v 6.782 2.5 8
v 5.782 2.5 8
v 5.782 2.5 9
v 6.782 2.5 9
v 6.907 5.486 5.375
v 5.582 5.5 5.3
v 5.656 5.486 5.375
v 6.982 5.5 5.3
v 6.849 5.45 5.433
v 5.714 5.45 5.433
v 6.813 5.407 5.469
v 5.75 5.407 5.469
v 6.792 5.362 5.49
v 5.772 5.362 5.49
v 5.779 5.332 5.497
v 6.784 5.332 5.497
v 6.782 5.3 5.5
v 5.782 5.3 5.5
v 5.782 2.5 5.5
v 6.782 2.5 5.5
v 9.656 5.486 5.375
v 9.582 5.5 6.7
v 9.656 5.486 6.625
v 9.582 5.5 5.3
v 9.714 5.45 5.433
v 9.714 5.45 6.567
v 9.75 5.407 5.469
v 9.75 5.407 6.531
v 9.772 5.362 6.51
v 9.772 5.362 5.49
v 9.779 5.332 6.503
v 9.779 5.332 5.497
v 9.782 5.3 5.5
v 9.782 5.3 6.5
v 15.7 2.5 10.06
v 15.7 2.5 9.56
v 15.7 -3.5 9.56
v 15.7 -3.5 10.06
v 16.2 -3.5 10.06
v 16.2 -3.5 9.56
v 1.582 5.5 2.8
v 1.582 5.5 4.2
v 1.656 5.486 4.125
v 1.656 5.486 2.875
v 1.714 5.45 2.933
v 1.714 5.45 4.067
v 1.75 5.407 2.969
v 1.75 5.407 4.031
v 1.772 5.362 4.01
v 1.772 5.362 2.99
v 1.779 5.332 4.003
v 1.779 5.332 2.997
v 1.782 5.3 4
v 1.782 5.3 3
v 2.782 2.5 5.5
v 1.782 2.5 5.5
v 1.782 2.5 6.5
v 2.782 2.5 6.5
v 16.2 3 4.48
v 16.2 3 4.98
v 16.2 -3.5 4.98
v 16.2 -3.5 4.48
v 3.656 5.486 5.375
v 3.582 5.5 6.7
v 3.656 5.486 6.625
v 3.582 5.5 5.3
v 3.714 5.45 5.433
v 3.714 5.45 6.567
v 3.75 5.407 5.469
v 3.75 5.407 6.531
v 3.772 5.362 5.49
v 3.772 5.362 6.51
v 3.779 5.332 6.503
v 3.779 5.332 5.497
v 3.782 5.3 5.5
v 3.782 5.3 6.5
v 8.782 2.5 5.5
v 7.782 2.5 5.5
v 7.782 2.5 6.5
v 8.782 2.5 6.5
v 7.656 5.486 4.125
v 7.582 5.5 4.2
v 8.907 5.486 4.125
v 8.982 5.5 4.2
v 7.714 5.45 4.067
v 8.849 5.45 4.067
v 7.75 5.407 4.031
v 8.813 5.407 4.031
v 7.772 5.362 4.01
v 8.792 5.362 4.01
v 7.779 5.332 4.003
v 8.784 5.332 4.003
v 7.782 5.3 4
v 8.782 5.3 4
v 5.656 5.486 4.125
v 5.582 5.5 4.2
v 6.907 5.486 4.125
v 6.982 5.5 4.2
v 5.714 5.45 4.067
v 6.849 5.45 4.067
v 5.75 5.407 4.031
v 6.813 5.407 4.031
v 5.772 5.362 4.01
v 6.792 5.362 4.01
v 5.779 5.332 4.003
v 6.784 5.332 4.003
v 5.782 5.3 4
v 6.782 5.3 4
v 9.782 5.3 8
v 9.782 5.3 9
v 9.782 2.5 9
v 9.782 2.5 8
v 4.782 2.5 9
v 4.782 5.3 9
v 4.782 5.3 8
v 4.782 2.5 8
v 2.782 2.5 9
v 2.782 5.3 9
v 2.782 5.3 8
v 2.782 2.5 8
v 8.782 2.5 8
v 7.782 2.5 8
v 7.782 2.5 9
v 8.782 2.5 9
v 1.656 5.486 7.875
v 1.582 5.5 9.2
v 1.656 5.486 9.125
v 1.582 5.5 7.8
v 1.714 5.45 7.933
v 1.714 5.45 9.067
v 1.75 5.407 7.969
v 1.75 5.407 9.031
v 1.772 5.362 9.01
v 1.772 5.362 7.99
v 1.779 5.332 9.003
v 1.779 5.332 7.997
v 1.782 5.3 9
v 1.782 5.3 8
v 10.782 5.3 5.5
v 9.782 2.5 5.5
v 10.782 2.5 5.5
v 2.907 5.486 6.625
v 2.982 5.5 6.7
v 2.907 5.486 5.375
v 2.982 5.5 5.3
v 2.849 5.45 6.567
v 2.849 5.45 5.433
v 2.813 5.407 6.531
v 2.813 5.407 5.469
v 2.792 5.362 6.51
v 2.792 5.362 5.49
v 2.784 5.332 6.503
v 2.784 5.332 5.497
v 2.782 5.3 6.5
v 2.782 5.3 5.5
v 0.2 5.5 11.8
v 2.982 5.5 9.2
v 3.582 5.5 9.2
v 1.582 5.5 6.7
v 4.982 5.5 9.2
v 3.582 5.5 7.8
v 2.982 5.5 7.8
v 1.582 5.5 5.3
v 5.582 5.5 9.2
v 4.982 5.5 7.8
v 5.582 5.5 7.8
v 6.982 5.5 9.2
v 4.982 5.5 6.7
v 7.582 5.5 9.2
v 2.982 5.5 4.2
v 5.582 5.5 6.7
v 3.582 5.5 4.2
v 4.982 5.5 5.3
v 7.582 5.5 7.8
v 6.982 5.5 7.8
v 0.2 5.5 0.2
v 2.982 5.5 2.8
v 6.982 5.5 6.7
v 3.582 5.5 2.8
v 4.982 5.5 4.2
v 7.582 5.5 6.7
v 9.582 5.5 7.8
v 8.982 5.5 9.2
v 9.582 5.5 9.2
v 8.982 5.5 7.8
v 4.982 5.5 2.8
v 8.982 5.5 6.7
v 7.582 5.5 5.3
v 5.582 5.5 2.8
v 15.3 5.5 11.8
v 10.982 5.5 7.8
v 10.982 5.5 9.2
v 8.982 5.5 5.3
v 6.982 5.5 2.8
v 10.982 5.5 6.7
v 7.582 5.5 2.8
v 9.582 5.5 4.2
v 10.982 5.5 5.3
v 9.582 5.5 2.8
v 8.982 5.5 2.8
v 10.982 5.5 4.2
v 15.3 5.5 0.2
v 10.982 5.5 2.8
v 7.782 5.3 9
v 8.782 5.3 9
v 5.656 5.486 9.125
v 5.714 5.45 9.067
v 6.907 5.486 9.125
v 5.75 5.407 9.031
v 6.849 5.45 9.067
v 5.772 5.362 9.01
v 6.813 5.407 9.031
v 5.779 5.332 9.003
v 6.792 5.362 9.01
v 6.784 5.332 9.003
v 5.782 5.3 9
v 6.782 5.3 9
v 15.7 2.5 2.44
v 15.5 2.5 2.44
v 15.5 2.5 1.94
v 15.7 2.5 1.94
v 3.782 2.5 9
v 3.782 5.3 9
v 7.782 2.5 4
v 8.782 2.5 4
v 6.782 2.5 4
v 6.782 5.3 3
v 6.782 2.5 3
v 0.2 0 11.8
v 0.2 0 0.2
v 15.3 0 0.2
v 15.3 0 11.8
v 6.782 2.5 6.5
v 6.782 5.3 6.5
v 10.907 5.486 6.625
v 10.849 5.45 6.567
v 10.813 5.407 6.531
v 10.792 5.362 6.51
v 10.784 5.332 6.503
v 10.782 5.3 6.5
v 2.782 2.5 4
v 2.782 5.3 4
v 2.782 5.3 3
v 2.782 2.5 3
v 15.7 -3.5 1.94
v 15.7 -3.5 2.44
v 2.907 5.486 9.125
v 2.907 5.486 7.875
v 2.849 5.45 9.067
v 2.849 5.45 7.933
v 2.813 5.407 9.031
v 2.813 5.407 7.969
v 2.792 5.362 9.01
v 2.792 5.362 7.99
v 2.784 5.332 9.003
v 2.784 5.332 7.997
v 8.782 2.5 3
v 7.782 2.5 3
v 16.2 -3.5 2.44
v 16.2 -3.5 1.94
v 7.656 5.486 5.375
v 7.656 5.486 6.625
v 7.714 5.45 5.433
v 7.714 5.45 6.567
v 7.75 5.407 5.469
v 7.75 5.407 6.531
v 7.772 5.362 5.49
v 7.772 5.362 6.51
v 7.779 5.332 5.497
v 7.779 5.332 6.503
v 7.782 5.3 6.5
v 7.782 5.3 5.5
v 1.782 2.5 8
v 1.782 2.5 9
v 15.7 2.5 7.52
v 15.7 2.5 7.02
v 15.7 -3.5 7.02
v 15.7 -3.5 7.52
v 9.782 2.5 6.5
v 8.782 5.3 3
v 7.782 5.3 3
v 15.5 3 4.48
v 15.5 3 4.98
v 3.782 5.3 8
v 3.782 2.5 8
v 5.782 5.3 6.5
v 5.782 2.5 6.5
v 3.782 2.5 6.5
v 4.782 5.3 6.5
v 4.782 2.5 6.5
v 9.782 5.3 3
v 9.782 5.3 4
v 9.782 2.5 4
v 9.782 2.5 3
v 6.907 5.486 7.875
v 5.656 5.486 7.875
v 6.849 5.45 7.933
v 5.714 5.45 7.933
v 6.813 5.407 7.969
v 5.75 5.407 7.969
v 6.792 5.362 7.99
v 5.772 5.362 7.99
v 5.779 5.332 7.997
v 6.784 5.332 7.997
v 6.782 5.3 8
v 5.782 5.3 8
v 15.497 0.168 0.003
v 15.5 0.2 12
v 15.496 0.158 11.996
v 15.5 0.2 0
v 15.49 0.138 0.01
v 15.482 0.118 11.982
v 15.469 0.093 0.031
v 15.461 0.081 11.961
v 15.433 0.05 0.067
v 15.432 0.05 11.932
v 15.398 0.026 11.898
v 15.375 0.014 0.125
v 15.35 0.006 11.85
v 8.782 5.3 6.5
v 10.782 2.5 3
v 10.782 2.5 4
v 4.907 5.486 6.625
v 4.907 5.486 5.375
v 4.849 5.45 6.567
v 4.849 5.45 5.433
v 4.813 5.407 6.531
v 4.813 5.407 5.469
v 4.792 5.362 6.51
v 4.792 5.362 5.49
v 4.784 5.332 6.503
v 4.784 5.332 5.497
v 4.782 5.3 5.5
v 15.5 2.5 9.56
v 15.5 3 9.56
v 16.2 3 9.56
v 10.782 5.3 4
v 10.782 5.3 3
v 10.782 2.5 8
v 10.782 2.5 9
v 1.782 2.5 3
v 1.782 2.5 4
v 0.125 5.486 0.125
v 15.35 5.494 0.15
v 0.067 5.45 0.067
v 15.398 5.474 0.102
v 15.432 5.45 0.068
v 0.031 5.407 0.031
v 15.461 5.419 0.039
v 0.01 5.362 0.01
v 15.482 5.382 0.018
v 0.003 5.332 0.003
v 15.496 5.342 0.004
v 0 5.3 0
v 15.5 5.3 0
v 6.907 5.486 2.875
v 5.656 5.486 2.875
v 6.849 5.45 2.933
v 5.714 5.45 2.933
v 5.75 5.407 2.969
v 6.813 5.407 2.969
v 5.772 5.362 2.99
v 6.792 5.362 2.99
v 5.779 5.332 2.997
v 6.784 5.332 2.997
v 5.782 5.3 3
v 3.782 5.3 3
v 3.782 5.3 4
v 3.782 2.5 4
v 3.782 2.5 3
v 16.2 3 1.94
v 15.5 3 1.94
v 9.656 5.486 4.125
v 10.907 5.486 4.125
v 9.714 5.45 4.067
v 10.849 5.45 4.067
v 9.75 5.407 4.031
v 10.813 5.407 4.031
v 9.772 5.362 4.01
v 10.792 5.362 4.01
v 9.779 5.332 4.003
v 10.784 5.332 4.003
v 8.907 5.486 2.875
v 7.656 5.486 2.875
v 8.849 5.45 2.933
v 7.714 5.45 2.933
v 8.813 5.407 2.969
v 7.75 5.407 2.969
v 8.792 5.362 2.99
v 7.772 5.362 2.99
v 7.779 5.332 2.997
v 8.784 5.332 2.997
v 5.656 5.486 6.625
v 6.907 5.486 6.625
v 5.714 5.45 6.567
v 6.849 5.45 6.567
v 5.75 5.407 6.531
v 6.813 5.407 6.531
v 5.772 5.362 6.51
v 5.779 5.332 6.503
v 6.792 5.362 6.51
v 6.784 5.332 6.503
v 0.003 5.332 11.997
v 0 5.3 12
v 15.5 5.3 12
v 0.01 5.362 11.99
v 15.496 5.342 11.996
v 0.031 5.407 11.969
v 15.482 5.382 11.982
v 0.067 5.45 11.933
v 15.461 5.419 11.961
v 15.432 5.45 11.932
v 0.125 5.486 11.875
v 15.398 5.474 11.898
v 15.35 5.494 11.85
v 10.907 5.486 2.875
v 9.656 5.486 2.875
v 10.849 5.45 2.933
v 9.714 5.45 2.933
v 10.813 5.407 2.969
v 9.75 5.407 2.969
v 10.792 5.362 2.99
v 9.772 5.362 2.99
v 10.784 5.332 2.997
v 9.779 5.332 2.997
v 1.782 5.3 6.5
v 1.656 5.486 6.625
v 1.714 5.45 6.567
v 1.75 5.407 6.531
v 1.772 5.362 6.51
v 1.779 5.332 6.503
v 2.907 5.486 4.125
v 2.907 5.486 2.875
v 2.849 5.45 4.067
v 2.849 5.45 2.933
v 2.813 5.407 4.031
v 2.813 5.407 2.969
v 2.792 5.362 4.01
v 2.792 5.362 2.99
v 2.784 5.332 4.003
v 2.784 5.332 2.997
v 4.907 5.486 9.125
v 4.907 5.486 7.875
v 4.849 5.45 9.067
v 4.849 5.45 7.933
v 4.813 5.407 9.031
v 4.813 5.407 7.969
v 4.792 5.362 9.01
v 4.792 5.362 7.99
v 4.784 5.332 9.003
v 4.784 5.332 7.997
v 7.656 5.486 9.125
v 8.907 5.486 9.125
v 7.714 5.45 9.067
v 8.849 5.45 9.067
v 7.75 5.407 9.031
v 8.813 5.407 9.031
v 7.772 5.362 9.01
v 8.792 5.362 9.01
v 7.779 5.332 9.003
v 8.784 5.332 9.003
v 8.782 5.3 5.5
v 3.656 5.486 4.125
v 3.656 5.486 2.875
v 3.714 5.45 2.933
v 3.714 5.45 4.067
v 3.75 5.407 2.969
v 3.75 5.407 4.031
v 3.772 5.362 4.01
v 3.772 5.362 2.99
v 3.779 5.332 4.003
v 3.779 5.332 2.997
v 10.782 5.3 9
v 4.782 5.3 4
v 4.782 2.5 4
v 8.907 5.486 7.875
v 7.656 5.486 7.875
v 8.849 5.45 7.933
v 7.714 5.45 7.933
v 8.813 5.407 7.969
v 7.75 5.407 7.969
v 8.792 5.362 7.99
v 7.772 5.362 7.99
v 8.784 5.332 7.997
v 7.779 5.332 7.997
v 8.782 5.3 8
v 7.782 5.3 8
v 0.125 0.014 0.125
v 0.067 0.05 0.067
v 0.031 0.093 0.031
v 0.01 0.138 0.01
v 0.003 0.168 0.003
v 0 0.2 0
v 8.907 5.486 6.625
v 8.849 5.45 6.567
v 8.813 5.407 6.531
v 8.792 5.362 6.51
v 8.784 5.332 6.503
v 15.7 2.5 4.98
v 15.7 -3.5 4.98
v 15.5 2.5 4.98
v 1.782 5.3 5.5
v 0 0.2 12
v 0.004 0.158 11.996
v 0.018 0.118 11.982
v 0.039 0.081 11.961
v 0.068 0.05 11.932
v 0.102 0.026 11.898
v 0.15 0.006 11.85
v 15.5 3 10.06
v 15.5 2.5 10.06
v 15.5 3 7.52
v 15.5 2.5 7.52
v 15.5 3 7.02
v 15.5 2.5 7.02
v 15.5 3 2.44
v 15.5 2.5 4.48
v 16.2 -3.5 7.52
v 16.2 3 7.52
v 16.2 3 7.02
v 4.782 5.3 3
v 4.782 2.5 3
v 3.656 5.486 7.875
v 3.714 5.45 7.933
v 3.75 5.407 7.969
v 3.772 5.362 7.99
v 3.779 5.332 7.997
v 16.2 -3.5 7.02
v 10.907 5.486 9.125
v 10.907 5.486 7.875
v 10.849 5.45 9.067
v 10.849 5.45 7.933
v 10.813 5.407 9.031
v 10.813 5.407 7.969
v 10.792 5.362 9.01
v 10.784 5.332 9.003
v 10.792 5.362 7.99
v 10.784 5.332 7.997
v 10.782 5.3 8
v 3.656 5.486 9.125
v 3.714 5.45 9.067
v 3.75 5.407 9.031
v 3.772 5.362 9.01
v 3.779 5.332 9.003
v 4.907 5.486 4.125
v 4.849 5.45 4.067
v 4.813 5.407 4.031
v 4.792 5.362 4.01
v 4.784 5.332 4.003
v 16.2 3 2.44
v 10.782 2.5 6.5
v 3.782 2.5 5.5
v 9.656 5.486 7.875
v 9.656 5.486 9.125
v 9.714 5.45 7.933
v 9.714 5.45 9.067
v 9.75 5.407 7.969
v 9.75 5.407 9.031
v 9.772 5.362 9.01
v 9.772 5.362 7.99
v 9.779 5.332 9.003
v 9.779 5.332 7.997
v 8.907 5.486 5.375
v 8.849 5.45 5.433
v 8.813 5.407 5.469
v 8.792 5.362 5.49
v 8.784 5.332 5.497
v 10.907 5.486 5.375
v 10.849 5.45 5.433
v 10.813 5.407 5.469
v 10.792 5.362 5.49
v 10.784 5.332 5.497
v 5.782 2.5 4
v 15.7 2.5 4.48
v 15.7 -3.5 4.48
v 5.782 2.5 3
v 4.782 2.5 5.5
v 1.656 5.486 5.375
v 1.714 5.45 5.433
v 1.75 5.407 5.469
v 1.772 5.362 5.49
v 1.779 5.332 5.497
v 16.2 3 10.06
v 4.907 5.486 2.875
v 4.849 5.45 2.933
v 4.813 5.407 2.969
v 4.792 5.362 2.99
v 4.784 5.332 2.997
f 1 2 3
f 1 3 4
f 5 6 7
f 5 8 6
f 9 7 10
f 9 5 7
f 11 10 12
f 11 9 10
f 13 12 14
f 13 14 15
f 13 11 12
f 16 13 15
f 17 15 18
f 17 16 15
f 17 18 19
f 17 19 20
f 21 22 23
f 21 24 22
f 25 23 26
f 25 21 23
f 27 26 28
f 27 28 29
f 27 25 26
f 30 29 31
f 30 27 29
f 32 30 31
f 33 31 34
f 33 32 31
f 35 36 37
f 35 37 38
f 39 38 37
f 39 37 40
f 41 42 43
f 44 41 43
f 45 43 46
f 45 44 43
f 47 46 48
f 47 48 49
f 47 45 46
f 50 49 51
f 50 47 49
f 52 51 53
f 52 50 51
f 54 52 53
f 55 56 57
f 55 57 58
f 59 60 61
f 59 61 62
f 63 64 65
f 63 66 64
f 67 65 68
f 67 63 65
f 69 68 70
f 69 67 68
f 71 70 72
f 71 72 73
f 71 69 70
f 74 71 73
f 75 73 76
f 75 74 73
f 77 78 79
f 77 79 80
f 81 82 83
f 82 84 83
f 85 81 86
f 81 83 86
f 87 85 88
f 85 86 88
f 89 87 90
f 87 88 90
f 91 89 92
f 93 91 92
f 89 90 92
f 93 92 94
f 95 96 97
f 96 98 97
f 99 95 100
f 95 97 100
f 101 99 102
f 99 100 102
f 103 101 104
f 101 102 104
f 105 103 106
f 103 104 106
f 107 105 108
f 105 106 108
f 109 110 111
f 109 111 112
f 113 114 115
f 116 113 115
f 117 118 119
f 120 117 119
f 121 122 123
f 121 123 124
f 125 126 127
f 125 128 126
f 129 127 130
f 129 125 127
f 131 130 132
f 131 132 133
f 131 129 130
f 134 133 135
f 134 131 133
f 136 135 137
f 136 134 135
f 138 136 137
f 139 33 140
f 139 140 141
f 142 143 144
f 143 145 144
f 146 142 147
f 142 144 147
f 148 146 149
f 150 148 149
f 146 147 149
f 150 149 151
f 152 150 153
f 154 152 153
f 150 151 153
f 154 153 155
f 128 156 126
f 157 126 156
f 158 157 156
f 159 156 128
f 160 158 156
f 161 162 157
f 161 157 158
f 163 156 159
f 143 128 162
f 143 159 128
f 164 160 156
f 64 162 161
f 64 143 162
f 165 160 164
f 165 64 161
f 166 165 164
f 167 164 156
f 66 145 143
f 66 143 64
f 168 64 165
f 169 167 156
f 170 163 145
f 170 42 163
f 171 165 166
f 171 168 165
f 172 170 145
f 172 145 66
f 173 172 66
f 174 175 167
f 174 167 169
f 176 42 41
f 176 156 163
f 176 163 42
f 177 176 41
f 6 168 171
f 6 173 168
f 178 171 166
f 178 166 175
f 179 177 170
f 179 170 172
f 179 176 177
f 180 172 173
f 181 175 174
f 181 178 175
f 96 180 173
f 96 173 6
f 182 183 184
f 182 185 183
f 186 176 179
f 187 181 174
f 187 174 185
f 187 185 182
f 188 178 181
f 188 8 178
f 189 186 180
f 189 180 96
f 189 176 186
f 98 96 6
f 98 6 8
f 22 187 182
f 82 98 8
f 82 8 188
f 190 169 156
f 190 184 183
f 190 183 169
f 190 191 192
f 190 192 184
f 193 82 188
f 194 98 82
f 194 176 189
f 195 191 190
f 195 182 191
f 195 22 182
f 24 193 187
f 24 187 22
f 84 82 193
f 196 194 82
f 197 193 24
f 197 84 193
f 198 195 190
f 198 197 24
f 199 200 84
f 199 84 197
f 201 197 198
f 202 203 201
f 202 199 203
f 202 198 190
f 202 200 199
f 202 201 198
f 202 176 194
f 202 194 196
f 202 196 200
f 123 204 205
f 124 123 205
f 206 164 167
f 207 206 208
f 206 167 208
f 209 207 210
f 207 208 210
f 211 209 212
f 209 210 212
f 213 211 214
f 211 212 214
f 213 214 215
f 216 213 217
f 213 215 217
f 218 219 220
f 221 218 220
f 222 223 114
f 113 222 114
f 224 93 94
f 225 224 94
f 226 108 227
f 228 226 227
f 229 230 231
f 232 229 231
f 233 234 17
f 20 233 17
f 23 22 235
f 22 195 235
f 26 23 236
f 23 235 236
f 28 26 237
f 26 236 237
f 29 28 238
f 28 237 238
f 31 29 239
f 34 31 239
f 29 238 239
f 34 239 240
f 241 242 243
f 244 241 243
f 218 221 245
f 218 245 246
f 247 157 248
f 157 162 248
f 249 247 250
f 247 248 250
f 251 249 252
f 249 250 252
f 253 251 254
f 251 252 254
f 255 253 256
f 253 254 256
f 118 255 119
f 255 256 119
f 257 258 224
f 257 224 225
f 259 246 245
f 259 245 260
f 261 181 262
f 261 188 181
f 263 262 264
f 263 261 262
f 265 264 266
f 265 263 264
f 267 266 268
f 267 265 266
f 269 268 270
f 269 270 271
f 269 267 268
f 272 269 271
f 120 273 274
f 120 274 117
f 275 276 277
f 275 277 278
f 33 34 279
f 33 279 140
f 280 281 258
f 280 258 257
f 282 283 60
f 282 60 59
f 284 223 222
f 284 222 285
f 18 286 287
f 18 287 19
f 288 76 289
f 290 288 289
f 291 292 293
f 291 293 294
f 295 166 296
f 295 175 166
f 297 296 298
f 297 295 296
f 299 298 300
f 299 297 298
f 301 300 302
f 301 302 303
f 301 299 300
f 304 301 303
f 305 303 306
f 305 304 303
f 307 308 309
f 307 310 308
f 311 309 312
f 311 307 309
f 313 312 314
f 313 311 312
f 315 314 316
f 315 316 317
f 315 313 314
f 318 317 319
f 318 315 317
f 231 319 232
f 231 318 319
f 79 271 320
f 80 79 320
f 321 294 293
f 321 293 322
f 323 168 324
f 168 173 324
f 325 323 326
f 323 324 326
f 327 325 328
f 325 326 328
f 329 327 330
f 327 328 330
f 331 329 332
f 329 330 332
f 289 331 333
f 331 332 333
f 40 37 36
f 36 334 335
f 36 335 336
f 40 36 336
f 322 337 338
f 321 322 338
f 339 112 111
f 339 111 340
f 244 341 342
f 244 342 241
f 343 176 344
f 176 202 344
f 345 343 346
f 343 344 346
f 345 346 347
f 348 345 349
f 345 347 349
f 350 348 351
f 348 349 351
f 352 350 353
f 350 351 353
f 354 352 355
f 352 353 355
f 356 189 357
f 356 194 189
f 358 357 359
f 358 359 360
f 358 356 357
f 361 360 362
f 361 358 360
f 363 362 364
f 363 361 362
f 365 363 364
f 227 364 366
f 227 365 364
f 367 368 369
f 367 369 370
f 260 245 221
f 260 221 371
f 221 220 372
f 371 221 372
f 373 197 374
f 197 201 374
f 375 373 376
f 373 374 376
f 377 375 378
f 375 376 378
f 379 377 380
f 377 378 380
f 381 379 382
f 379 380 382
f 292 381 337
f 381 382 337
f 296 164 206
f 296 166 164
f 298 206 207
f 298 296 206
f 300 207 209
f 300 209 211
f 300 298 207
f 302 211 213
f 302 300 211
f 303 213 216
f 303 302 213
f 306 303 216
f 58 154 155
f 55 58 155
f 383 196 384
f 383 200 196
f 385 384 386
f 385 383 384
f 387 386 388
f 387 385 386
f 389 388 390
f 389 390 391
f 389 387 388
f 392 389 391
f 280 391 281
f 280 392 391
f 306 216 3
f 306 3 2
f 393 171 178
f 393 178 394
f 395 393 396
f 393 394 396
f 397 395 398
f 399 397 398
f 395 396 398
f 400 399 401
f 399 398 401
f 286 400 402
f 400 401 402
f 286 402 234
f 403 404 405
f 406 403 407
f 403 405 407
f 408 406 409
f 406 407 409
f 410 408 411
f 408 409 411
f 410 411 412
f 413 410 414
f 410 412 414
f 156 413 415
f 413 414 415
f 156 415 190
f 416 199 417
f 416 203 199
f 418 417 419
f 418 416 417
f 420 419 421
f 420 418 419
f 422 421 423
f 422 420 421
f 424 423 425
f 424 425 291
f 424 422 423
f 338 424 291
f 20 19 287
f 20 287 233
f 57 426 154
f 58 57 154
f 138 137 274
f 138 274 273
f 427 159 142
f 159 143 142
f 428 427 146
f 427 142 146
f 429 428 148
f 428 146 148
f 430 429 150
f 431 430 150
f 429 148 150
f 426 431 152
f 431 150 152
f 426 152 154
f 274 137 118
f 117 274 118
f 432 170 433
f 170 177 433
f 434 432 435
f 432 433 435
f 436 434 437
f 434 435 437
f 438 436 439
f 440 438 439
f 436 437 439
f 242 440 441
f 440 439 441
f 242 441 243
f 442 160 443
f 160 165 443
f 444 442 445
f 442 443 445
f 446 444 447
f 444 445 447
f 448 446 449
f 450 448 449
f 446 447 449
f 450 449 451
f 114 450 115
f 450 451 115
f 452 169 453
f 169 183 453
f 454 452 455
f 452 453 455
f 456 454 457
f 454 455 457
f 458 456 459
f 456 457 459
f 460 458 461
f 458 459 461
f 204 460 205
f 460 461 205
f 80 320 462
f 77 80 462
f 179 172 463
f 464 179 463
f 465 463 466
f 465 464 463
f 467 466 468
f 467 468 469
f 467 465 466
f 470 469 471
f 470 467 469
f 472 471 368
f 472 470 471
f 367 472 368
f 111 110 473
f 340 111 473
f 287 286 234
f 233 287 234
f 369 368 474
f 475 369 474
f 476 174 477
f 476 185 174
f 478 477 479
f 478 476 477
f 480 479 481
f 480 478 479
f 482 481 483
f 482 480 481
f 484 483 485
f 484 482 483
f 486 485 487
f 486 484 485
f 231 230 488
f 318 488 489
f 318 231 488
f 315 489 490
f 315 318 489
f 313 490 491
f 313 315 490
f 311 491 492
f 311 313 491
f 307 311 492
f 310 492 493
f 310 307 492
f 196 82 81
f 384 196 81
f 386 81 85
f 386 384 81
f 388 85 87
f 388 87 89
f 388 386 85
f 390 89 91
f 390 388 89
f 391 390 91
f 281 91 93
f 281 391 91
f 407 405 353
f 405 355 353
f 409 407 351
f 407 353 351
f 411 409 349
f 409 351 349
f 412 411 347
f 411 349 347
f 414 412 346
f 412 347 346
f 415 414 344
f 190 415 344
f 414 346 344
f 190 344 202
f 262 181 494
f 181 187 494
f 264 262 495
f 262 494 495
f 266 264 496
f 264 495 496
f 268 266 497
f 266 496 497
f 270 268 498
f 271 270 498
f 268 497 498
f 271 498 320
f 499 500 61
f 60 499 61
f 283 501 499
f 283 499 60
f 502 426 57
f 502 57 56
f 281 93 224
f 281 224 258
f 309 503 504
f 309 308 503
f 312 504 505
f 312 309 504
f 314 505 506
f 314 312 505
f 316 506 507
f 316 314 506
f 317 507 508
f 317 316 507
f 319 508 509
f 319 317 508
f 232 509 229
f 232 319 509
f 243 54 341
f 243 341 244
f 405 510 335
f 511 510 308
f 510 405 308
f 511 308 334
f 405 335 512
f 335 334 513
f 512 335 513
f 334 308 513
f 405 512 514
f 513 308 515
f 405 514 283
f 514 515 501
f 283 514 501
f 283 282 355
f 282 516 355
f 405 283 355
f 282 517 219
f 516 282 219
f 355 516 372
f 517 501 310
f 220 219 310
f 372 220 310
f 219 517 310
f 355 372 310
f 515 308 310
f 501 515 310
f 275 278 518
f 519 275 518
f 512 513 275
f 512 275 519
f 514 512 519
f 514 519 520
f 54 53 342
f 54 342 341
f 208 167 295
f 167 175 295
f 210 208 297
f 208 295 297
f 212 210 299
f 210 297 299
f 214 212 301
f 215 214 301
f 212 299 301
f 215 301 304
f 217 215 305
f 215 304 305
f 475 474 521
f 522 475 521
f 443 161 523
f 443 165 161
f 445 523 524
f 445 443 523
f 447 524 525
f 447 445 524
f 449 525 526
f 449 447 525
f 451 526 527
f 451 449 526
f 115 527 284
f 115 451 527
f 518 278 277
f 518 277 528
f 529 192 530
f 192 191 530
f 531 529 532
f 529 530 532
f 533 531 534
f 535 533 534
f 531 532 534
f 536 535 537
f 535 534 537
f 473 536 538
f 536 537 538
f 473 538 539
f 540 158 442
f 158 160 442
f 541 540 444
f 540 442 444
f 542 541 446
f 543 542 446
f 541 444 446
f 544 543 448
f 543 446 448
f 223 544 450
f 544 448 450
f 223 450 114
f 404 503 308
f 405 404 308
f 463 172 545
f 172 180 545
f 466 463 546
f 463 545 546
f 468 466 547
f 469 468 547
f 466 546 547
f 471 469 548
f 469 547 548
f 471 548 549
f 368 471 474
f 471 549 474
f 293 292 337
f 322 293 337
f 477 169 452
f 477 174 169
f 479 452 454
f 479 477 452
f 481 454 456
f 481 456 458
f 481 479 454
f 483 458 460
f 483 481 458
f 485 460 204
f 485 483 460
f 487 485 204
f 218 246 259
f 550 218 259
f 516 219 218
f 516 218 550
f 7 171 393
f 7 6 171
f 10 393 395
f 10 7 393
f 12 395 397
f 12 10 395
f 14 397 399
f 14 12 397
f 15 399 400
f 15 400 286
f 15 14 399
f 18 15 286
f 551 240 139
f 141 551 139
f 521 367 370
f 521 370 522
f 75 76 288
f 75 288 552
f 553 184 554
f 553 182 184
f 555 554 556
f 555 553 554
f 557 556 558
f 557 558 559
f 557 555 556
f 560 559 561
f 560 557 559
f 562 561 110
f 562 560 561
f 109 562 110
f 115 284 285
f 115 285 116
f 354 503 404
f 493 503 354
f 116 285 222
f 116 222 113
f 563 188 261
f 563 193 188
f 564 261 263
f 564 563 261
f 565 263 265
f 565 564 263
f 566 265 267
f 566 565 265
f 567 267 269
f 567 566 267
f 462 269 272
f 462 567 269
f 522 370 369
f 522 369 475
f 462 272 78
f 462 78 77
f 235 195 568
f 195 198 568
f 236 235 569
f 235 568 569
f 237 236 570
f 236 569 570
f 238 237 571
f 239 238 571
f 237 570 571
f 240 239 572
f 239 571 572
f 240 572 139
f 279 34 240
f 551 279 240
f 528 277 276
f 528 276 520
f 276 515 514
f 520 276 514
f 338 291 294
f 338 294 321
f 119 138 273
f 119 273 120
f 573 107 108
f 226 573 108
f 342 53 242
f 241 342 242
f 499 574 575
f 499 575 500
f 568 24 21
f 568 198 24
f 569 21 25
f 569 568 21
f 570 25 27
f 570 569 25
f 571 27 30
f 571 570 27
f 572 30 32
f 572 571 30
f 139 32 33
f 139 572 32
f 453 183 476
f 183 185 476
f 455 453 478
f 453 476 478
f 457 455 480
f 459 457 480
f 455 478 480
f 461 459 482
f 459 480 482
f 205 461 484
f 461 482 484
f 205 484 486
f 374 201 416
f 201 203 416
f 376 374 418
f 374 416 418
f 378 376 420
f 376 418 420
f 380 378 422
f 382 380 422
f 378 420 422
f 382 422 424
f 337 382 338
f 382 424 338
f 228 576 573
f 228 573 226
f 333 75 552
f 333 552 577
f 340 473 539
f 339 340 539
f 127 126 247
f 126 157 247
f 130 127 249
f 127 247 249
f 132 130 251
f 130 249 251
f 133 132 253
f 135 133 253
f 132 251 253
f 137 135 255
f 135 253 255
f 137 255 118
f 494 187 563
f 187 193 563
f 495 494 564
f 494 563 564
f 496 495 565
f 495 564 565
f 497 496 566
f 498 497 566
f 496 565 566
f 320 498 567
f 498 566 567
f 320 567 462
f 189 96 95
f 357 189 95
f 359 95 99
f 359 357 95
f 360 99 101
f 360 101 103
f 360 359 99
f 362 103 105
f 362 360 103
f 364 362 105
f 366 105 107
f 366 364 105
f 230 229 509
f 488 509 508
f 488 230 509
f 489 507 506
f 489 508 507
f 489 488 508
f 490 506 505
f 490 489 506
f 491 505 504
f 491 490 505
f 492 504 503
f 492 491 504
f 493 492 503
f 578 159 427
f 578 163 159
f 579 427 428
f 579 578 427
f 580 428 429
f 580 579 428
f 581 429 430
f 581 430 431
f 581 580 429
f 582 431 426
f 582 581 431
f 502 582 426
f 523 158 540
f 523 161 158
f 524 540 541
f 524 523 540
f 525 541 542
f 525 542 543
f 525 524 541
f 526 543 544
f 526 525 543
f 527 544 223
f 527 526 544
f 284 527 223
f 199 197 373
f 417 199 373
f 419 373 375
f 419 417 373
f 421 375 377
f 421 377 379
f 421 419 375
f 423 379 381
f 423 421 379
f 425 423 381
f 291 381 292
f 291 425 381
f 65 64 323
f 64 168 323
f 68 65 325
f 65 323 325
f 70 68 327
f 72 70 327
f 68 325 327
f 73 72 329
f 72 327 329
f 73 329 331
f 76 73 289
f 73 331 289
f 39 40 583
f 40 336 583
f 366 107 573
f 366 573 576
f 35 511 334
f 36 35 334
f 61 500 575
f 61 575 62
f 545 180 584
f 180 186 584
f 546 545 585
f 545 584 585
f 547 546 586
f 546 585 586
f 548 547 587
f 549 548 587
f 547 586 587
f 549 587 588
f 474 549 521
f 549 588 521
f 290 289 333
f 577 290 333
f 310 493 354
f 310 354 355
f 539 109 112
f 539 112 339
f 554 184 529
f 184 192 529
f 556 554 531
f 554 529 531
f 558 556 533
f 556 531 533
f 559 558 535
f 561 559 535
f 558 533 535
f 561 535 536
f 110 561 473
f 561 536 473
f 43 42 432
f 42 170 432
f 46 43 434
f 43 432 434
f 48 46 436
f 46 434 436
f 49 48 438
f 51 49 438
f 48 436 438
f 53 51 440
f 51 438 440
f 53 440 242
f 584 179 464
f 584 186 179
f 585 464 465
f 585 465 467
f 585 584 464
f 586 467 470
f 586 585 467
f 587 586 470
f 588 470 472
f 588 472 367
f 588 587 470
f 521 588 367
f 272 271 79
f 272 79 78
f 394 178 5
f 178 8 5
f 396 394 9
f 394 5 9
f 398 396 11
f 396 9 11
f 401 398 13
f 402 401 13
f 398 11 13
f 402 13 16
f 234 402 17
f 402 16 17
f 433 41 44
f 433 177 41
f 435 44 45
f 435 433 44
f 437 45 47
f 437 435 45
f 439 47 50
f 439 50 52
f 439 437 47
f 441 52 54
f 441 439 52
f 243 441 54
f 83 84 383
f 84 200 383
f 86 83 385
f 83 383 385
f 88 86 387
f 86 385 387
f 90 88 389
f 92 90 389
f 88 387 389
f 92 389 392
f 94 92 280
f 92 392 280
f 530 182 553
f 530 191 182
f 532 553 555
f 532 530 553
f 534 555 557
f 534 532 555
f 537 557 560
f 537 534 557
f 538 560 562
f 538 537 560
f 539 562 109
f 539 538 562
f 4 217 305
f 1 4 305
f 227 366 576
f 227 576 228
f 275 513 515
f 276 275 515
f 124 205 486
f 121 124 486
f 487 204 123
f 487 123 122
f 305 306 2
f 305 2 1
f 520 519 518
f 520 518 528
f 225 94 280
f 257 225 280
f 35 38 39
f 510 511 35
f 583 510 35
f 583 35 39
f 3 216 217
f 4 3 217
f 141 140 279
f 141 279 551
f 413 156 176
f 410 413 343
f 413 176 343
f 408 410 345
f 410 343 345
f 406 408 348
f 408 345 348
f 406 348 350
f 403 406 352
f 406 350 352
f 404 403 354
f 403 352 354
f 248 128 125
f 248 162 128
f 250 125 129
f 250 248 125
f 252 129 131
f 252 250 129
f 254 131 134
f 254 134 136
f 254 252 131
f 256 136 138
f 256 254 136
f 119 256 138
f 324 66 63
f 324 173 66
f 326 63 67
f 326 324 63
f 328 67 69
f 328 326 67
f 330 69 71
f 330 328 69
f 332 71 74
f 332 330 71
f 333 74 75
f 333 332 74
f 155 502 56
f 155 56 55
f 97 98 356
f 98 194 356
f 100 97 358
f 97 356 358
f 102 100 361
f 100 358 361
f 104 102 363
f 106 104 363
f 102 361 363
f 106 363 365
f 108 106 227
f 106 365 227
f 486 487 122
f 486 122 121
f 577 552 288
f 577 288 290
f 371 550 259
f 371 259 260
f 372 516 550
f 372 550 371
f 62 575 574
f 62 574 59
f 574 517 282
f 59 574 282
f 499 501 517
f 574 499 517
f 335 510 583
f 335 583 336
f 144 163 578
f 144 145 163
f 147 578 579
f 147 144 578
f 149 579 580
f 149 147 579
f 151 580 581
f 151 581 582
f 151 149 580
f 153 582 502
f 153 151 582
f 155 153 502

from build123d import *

# Parameters (mm, degrees)
SKETCH1_W           = 15.5
SKETCH1_H           = 12
BOSS_EXTRUDE1_DEPTH = 5.5
SKETCH2_W           = 0.5
SKETCH2_H           = 0.5
BOSS_EXTRUDE2_DEPTH = 0.7
SKETCH3_W           = 0.5
SKETCH3_H           = 0.5
BOSS_EXTRUDE3_DEPTH = 6
SKETCH4_W           = 1
SKETCH4_H           = 1
CUT_EXTRUDE1_DEPTH  = 3
LPATTERN1_COUNT     = 5
LPATTERN1_PITCH     = 2
FILLET1_R           = 0.2
FILLET2_R           = 0.2


with BuildPart() as part:
    # Sketch1 → Boss-Extrude1 (new body)
    with BuildSketch(Plane(origin=(0, 0, 0), x_dir=(1, 0, 0), z_dir=(0, 1, 0))):
        with Locations((7.75, -6)):
            Rectangle(SKETCH1_W, SKETCH1_H)
    extrude(amount=BOSS_EXTRUDE1_DEPTH)

    # Sketch2 → Boss-Extrude2 (add)
    with BuildSketch(Plane(origin=(15.5, 0, 0), x_dir=(0, 0, -1), z_dir=(1, 0, 0))):
        with Locations((-9.81, 2.75)):
            Rectangle(SKETCH2_W, SKETCH2_H)
        with Locations((-7.27, 2.75)):
            Rectangle(SKETCH2_W, SKETCH2_H)
        with Locations((-4.73, 2.75)):
            Rectangle(SKETCH2_W, SKETCH2_H)
        with Locations((-2.19, 2.75)):
            Rectangle(SKETCH2_W, SKETCH2_H)
    extrude(amount=BOSS_EXTRUDE2_DEPTH)

    # Sketch3 → Boss-Extrude3 (add)
    with BuildSketch(Plane.XZ.offset(-2.5)):
        with Locations((15.95, 9.81)):
            Rectangle(SKETCH3_W, SKETCH3_H)
        with Locations((15.95, 7.27)):
            Rectangle(SKETCH3_W, SKETCH3_H)
        with Locations((15.95, 4.73)):
            Rectangle(SKETCH3_W, SKETCH3_H)
        with Locations((15.95, 2.19)):
            Rectangle(SKETCH3_W, SKETCH3_H)
    extrude(amount=BOSS_EXTRUDE3_DEPTH)

    # Sketch4 → Cut-Extrude1 (cut)
    with BuildSketch(Plane(origin=(0, 5.5, 0), x_dir=(1, 0, 0), z_dir=(0, 1, 0))):
        with Locations((2.281693228, -3.5)):
            Rectangle(SKETCH4_W, SKETCH4_H)
        with Locations((2.281693228, -6)):
            Rectangle(SKETCH4_W, SKETCH4_H)
        with Locations((2.281693228, -8.5)):
            Rectangle(SKETCH4_W, SKETCH4_H)
    cut_extrude1 = extrude(amount=-CUT_EXTRUDE1_DEPTH, mode=Mode.SUBTRACT)

    # LPattern1: Cut-Extrude1 ×5
    with Locations(*[(i * LPATTERN1_PITCH, 0, 0) for i in range(1, LPATTERN1_COUNT)]):
        add(cut_extrude1, mode=Mode.SUBTRACT)

    # Fillet1
    fillet1_edges = [part.edges().sort_by_distance(p)[0] for p in [
        (2.781693228, 5.5, 3.5),
        (2.281693228, 5.5, 3),
        (1.781693228, 5.5, 3.5),
        (2.281693228, 5.5, 4),
        (15.5, 5.5, 6),
        (1.781693228, 5.5, 6),
        (2.281693228, 5.5, 6.5),
        (2.781693228, 5.5, 6),
        (2.281693228, 5.5, 5.5),
        (1.781693228, 5.5, 8.5),
        (2.281693228, 5.5, 9),
        (2.781693228, 5.5, 8.5),
        (2.281693228, 5.5, 8),
        (4.781693228, 5.5, 3.5),
        (4.281693228, 5.5, 3),
        (3.781693228, 5.5, 3.5),
        (4.281693228, 5.5, 4),
        (6.781693228, 5.5, 3.5),
        (7.75, 5.5, 0),
        (6.281693228, 5.5, 4),
        (5.781693228, 5.5, 3.5),
        (6.281693228, 5.5, 3),
        (8.781693228, 5.5, 3.5),
        (8.281693228, 5.5, 4),
        (7.781693228, 5.5, 3.5),
        (8.281693228, 5.5, 3),
        (10.781693228, 5.5, 3.5),
        (10.281693228, 5.5, 4),
        (9.781693228, 5.5, 3.5),
        (10.281693228, 5.5, 3),
        (3.781693228, 5.5, 8.5),
        (4.281693228, 5.5, 9),
        (4.781693228, 5.5, 8.5),
        (4.281693228, 5.5, 8),
        (5.781693228, 5.5, 8.5),
        (6.281693228, 5.5, 8),
        (6.781693228, 5.5, 8.5),
        (6.281693228, 5.5, 9),
        (7.781693228, 5.5, 8.5),
        (8.281693228, 5.5, 8),
        (8.781693228, 5.5, 8.5),
        (8.281693228, 5.5, 9),
        (9.781693228, 5.5, 8.5),
        (10.281693228, 5.5, 8),
        (10.781693228, 5.5, 8.5),
        (10.281693228, 5.5, 9),
        (3.781693228, 5.5, 6),
        (4.281693228, 5.5, 6.5),
        (4.781693228, 5.5, 6),
        (4.281693228, 5.5, 5.5),
        (5.781693228, 5.5, 6),
        (6.281693228, 5.5, 5.5),
        (6.781693228, 5.5, 6),
        (6.281693228, 5.5, 6.5),
        (7.781693228, 5.5, 6),
        (8.281693228, 5.5, 5.5),
        (8.781693228, 5.5, 6),
        (8.281693228, 5.5, 6.5),
        (9.781693228, 5.5, 6),
        (10.281693228, 5.5, 5.5),
        (10.781693228, 5.5, 6),
        (10.281693228, 5.5, 6.5),
        (0, 5.5, 6),
        (7.75, 5.5, 12),
    ]]
    fillet(fillet1_edges, radius=FILLET1_R)

    # Fillet2
    fillet2_edges = [part.edges().sort_by_distance(p)[0] for p in [
        (7.75, 0, 0),
        (15.5, 0, 6),
        (7.75, 0, 12),
        (0, 0, 6),
    ]]
    fillet(fillet2_edges, radius=FILLET2_R)


solid = part.part
